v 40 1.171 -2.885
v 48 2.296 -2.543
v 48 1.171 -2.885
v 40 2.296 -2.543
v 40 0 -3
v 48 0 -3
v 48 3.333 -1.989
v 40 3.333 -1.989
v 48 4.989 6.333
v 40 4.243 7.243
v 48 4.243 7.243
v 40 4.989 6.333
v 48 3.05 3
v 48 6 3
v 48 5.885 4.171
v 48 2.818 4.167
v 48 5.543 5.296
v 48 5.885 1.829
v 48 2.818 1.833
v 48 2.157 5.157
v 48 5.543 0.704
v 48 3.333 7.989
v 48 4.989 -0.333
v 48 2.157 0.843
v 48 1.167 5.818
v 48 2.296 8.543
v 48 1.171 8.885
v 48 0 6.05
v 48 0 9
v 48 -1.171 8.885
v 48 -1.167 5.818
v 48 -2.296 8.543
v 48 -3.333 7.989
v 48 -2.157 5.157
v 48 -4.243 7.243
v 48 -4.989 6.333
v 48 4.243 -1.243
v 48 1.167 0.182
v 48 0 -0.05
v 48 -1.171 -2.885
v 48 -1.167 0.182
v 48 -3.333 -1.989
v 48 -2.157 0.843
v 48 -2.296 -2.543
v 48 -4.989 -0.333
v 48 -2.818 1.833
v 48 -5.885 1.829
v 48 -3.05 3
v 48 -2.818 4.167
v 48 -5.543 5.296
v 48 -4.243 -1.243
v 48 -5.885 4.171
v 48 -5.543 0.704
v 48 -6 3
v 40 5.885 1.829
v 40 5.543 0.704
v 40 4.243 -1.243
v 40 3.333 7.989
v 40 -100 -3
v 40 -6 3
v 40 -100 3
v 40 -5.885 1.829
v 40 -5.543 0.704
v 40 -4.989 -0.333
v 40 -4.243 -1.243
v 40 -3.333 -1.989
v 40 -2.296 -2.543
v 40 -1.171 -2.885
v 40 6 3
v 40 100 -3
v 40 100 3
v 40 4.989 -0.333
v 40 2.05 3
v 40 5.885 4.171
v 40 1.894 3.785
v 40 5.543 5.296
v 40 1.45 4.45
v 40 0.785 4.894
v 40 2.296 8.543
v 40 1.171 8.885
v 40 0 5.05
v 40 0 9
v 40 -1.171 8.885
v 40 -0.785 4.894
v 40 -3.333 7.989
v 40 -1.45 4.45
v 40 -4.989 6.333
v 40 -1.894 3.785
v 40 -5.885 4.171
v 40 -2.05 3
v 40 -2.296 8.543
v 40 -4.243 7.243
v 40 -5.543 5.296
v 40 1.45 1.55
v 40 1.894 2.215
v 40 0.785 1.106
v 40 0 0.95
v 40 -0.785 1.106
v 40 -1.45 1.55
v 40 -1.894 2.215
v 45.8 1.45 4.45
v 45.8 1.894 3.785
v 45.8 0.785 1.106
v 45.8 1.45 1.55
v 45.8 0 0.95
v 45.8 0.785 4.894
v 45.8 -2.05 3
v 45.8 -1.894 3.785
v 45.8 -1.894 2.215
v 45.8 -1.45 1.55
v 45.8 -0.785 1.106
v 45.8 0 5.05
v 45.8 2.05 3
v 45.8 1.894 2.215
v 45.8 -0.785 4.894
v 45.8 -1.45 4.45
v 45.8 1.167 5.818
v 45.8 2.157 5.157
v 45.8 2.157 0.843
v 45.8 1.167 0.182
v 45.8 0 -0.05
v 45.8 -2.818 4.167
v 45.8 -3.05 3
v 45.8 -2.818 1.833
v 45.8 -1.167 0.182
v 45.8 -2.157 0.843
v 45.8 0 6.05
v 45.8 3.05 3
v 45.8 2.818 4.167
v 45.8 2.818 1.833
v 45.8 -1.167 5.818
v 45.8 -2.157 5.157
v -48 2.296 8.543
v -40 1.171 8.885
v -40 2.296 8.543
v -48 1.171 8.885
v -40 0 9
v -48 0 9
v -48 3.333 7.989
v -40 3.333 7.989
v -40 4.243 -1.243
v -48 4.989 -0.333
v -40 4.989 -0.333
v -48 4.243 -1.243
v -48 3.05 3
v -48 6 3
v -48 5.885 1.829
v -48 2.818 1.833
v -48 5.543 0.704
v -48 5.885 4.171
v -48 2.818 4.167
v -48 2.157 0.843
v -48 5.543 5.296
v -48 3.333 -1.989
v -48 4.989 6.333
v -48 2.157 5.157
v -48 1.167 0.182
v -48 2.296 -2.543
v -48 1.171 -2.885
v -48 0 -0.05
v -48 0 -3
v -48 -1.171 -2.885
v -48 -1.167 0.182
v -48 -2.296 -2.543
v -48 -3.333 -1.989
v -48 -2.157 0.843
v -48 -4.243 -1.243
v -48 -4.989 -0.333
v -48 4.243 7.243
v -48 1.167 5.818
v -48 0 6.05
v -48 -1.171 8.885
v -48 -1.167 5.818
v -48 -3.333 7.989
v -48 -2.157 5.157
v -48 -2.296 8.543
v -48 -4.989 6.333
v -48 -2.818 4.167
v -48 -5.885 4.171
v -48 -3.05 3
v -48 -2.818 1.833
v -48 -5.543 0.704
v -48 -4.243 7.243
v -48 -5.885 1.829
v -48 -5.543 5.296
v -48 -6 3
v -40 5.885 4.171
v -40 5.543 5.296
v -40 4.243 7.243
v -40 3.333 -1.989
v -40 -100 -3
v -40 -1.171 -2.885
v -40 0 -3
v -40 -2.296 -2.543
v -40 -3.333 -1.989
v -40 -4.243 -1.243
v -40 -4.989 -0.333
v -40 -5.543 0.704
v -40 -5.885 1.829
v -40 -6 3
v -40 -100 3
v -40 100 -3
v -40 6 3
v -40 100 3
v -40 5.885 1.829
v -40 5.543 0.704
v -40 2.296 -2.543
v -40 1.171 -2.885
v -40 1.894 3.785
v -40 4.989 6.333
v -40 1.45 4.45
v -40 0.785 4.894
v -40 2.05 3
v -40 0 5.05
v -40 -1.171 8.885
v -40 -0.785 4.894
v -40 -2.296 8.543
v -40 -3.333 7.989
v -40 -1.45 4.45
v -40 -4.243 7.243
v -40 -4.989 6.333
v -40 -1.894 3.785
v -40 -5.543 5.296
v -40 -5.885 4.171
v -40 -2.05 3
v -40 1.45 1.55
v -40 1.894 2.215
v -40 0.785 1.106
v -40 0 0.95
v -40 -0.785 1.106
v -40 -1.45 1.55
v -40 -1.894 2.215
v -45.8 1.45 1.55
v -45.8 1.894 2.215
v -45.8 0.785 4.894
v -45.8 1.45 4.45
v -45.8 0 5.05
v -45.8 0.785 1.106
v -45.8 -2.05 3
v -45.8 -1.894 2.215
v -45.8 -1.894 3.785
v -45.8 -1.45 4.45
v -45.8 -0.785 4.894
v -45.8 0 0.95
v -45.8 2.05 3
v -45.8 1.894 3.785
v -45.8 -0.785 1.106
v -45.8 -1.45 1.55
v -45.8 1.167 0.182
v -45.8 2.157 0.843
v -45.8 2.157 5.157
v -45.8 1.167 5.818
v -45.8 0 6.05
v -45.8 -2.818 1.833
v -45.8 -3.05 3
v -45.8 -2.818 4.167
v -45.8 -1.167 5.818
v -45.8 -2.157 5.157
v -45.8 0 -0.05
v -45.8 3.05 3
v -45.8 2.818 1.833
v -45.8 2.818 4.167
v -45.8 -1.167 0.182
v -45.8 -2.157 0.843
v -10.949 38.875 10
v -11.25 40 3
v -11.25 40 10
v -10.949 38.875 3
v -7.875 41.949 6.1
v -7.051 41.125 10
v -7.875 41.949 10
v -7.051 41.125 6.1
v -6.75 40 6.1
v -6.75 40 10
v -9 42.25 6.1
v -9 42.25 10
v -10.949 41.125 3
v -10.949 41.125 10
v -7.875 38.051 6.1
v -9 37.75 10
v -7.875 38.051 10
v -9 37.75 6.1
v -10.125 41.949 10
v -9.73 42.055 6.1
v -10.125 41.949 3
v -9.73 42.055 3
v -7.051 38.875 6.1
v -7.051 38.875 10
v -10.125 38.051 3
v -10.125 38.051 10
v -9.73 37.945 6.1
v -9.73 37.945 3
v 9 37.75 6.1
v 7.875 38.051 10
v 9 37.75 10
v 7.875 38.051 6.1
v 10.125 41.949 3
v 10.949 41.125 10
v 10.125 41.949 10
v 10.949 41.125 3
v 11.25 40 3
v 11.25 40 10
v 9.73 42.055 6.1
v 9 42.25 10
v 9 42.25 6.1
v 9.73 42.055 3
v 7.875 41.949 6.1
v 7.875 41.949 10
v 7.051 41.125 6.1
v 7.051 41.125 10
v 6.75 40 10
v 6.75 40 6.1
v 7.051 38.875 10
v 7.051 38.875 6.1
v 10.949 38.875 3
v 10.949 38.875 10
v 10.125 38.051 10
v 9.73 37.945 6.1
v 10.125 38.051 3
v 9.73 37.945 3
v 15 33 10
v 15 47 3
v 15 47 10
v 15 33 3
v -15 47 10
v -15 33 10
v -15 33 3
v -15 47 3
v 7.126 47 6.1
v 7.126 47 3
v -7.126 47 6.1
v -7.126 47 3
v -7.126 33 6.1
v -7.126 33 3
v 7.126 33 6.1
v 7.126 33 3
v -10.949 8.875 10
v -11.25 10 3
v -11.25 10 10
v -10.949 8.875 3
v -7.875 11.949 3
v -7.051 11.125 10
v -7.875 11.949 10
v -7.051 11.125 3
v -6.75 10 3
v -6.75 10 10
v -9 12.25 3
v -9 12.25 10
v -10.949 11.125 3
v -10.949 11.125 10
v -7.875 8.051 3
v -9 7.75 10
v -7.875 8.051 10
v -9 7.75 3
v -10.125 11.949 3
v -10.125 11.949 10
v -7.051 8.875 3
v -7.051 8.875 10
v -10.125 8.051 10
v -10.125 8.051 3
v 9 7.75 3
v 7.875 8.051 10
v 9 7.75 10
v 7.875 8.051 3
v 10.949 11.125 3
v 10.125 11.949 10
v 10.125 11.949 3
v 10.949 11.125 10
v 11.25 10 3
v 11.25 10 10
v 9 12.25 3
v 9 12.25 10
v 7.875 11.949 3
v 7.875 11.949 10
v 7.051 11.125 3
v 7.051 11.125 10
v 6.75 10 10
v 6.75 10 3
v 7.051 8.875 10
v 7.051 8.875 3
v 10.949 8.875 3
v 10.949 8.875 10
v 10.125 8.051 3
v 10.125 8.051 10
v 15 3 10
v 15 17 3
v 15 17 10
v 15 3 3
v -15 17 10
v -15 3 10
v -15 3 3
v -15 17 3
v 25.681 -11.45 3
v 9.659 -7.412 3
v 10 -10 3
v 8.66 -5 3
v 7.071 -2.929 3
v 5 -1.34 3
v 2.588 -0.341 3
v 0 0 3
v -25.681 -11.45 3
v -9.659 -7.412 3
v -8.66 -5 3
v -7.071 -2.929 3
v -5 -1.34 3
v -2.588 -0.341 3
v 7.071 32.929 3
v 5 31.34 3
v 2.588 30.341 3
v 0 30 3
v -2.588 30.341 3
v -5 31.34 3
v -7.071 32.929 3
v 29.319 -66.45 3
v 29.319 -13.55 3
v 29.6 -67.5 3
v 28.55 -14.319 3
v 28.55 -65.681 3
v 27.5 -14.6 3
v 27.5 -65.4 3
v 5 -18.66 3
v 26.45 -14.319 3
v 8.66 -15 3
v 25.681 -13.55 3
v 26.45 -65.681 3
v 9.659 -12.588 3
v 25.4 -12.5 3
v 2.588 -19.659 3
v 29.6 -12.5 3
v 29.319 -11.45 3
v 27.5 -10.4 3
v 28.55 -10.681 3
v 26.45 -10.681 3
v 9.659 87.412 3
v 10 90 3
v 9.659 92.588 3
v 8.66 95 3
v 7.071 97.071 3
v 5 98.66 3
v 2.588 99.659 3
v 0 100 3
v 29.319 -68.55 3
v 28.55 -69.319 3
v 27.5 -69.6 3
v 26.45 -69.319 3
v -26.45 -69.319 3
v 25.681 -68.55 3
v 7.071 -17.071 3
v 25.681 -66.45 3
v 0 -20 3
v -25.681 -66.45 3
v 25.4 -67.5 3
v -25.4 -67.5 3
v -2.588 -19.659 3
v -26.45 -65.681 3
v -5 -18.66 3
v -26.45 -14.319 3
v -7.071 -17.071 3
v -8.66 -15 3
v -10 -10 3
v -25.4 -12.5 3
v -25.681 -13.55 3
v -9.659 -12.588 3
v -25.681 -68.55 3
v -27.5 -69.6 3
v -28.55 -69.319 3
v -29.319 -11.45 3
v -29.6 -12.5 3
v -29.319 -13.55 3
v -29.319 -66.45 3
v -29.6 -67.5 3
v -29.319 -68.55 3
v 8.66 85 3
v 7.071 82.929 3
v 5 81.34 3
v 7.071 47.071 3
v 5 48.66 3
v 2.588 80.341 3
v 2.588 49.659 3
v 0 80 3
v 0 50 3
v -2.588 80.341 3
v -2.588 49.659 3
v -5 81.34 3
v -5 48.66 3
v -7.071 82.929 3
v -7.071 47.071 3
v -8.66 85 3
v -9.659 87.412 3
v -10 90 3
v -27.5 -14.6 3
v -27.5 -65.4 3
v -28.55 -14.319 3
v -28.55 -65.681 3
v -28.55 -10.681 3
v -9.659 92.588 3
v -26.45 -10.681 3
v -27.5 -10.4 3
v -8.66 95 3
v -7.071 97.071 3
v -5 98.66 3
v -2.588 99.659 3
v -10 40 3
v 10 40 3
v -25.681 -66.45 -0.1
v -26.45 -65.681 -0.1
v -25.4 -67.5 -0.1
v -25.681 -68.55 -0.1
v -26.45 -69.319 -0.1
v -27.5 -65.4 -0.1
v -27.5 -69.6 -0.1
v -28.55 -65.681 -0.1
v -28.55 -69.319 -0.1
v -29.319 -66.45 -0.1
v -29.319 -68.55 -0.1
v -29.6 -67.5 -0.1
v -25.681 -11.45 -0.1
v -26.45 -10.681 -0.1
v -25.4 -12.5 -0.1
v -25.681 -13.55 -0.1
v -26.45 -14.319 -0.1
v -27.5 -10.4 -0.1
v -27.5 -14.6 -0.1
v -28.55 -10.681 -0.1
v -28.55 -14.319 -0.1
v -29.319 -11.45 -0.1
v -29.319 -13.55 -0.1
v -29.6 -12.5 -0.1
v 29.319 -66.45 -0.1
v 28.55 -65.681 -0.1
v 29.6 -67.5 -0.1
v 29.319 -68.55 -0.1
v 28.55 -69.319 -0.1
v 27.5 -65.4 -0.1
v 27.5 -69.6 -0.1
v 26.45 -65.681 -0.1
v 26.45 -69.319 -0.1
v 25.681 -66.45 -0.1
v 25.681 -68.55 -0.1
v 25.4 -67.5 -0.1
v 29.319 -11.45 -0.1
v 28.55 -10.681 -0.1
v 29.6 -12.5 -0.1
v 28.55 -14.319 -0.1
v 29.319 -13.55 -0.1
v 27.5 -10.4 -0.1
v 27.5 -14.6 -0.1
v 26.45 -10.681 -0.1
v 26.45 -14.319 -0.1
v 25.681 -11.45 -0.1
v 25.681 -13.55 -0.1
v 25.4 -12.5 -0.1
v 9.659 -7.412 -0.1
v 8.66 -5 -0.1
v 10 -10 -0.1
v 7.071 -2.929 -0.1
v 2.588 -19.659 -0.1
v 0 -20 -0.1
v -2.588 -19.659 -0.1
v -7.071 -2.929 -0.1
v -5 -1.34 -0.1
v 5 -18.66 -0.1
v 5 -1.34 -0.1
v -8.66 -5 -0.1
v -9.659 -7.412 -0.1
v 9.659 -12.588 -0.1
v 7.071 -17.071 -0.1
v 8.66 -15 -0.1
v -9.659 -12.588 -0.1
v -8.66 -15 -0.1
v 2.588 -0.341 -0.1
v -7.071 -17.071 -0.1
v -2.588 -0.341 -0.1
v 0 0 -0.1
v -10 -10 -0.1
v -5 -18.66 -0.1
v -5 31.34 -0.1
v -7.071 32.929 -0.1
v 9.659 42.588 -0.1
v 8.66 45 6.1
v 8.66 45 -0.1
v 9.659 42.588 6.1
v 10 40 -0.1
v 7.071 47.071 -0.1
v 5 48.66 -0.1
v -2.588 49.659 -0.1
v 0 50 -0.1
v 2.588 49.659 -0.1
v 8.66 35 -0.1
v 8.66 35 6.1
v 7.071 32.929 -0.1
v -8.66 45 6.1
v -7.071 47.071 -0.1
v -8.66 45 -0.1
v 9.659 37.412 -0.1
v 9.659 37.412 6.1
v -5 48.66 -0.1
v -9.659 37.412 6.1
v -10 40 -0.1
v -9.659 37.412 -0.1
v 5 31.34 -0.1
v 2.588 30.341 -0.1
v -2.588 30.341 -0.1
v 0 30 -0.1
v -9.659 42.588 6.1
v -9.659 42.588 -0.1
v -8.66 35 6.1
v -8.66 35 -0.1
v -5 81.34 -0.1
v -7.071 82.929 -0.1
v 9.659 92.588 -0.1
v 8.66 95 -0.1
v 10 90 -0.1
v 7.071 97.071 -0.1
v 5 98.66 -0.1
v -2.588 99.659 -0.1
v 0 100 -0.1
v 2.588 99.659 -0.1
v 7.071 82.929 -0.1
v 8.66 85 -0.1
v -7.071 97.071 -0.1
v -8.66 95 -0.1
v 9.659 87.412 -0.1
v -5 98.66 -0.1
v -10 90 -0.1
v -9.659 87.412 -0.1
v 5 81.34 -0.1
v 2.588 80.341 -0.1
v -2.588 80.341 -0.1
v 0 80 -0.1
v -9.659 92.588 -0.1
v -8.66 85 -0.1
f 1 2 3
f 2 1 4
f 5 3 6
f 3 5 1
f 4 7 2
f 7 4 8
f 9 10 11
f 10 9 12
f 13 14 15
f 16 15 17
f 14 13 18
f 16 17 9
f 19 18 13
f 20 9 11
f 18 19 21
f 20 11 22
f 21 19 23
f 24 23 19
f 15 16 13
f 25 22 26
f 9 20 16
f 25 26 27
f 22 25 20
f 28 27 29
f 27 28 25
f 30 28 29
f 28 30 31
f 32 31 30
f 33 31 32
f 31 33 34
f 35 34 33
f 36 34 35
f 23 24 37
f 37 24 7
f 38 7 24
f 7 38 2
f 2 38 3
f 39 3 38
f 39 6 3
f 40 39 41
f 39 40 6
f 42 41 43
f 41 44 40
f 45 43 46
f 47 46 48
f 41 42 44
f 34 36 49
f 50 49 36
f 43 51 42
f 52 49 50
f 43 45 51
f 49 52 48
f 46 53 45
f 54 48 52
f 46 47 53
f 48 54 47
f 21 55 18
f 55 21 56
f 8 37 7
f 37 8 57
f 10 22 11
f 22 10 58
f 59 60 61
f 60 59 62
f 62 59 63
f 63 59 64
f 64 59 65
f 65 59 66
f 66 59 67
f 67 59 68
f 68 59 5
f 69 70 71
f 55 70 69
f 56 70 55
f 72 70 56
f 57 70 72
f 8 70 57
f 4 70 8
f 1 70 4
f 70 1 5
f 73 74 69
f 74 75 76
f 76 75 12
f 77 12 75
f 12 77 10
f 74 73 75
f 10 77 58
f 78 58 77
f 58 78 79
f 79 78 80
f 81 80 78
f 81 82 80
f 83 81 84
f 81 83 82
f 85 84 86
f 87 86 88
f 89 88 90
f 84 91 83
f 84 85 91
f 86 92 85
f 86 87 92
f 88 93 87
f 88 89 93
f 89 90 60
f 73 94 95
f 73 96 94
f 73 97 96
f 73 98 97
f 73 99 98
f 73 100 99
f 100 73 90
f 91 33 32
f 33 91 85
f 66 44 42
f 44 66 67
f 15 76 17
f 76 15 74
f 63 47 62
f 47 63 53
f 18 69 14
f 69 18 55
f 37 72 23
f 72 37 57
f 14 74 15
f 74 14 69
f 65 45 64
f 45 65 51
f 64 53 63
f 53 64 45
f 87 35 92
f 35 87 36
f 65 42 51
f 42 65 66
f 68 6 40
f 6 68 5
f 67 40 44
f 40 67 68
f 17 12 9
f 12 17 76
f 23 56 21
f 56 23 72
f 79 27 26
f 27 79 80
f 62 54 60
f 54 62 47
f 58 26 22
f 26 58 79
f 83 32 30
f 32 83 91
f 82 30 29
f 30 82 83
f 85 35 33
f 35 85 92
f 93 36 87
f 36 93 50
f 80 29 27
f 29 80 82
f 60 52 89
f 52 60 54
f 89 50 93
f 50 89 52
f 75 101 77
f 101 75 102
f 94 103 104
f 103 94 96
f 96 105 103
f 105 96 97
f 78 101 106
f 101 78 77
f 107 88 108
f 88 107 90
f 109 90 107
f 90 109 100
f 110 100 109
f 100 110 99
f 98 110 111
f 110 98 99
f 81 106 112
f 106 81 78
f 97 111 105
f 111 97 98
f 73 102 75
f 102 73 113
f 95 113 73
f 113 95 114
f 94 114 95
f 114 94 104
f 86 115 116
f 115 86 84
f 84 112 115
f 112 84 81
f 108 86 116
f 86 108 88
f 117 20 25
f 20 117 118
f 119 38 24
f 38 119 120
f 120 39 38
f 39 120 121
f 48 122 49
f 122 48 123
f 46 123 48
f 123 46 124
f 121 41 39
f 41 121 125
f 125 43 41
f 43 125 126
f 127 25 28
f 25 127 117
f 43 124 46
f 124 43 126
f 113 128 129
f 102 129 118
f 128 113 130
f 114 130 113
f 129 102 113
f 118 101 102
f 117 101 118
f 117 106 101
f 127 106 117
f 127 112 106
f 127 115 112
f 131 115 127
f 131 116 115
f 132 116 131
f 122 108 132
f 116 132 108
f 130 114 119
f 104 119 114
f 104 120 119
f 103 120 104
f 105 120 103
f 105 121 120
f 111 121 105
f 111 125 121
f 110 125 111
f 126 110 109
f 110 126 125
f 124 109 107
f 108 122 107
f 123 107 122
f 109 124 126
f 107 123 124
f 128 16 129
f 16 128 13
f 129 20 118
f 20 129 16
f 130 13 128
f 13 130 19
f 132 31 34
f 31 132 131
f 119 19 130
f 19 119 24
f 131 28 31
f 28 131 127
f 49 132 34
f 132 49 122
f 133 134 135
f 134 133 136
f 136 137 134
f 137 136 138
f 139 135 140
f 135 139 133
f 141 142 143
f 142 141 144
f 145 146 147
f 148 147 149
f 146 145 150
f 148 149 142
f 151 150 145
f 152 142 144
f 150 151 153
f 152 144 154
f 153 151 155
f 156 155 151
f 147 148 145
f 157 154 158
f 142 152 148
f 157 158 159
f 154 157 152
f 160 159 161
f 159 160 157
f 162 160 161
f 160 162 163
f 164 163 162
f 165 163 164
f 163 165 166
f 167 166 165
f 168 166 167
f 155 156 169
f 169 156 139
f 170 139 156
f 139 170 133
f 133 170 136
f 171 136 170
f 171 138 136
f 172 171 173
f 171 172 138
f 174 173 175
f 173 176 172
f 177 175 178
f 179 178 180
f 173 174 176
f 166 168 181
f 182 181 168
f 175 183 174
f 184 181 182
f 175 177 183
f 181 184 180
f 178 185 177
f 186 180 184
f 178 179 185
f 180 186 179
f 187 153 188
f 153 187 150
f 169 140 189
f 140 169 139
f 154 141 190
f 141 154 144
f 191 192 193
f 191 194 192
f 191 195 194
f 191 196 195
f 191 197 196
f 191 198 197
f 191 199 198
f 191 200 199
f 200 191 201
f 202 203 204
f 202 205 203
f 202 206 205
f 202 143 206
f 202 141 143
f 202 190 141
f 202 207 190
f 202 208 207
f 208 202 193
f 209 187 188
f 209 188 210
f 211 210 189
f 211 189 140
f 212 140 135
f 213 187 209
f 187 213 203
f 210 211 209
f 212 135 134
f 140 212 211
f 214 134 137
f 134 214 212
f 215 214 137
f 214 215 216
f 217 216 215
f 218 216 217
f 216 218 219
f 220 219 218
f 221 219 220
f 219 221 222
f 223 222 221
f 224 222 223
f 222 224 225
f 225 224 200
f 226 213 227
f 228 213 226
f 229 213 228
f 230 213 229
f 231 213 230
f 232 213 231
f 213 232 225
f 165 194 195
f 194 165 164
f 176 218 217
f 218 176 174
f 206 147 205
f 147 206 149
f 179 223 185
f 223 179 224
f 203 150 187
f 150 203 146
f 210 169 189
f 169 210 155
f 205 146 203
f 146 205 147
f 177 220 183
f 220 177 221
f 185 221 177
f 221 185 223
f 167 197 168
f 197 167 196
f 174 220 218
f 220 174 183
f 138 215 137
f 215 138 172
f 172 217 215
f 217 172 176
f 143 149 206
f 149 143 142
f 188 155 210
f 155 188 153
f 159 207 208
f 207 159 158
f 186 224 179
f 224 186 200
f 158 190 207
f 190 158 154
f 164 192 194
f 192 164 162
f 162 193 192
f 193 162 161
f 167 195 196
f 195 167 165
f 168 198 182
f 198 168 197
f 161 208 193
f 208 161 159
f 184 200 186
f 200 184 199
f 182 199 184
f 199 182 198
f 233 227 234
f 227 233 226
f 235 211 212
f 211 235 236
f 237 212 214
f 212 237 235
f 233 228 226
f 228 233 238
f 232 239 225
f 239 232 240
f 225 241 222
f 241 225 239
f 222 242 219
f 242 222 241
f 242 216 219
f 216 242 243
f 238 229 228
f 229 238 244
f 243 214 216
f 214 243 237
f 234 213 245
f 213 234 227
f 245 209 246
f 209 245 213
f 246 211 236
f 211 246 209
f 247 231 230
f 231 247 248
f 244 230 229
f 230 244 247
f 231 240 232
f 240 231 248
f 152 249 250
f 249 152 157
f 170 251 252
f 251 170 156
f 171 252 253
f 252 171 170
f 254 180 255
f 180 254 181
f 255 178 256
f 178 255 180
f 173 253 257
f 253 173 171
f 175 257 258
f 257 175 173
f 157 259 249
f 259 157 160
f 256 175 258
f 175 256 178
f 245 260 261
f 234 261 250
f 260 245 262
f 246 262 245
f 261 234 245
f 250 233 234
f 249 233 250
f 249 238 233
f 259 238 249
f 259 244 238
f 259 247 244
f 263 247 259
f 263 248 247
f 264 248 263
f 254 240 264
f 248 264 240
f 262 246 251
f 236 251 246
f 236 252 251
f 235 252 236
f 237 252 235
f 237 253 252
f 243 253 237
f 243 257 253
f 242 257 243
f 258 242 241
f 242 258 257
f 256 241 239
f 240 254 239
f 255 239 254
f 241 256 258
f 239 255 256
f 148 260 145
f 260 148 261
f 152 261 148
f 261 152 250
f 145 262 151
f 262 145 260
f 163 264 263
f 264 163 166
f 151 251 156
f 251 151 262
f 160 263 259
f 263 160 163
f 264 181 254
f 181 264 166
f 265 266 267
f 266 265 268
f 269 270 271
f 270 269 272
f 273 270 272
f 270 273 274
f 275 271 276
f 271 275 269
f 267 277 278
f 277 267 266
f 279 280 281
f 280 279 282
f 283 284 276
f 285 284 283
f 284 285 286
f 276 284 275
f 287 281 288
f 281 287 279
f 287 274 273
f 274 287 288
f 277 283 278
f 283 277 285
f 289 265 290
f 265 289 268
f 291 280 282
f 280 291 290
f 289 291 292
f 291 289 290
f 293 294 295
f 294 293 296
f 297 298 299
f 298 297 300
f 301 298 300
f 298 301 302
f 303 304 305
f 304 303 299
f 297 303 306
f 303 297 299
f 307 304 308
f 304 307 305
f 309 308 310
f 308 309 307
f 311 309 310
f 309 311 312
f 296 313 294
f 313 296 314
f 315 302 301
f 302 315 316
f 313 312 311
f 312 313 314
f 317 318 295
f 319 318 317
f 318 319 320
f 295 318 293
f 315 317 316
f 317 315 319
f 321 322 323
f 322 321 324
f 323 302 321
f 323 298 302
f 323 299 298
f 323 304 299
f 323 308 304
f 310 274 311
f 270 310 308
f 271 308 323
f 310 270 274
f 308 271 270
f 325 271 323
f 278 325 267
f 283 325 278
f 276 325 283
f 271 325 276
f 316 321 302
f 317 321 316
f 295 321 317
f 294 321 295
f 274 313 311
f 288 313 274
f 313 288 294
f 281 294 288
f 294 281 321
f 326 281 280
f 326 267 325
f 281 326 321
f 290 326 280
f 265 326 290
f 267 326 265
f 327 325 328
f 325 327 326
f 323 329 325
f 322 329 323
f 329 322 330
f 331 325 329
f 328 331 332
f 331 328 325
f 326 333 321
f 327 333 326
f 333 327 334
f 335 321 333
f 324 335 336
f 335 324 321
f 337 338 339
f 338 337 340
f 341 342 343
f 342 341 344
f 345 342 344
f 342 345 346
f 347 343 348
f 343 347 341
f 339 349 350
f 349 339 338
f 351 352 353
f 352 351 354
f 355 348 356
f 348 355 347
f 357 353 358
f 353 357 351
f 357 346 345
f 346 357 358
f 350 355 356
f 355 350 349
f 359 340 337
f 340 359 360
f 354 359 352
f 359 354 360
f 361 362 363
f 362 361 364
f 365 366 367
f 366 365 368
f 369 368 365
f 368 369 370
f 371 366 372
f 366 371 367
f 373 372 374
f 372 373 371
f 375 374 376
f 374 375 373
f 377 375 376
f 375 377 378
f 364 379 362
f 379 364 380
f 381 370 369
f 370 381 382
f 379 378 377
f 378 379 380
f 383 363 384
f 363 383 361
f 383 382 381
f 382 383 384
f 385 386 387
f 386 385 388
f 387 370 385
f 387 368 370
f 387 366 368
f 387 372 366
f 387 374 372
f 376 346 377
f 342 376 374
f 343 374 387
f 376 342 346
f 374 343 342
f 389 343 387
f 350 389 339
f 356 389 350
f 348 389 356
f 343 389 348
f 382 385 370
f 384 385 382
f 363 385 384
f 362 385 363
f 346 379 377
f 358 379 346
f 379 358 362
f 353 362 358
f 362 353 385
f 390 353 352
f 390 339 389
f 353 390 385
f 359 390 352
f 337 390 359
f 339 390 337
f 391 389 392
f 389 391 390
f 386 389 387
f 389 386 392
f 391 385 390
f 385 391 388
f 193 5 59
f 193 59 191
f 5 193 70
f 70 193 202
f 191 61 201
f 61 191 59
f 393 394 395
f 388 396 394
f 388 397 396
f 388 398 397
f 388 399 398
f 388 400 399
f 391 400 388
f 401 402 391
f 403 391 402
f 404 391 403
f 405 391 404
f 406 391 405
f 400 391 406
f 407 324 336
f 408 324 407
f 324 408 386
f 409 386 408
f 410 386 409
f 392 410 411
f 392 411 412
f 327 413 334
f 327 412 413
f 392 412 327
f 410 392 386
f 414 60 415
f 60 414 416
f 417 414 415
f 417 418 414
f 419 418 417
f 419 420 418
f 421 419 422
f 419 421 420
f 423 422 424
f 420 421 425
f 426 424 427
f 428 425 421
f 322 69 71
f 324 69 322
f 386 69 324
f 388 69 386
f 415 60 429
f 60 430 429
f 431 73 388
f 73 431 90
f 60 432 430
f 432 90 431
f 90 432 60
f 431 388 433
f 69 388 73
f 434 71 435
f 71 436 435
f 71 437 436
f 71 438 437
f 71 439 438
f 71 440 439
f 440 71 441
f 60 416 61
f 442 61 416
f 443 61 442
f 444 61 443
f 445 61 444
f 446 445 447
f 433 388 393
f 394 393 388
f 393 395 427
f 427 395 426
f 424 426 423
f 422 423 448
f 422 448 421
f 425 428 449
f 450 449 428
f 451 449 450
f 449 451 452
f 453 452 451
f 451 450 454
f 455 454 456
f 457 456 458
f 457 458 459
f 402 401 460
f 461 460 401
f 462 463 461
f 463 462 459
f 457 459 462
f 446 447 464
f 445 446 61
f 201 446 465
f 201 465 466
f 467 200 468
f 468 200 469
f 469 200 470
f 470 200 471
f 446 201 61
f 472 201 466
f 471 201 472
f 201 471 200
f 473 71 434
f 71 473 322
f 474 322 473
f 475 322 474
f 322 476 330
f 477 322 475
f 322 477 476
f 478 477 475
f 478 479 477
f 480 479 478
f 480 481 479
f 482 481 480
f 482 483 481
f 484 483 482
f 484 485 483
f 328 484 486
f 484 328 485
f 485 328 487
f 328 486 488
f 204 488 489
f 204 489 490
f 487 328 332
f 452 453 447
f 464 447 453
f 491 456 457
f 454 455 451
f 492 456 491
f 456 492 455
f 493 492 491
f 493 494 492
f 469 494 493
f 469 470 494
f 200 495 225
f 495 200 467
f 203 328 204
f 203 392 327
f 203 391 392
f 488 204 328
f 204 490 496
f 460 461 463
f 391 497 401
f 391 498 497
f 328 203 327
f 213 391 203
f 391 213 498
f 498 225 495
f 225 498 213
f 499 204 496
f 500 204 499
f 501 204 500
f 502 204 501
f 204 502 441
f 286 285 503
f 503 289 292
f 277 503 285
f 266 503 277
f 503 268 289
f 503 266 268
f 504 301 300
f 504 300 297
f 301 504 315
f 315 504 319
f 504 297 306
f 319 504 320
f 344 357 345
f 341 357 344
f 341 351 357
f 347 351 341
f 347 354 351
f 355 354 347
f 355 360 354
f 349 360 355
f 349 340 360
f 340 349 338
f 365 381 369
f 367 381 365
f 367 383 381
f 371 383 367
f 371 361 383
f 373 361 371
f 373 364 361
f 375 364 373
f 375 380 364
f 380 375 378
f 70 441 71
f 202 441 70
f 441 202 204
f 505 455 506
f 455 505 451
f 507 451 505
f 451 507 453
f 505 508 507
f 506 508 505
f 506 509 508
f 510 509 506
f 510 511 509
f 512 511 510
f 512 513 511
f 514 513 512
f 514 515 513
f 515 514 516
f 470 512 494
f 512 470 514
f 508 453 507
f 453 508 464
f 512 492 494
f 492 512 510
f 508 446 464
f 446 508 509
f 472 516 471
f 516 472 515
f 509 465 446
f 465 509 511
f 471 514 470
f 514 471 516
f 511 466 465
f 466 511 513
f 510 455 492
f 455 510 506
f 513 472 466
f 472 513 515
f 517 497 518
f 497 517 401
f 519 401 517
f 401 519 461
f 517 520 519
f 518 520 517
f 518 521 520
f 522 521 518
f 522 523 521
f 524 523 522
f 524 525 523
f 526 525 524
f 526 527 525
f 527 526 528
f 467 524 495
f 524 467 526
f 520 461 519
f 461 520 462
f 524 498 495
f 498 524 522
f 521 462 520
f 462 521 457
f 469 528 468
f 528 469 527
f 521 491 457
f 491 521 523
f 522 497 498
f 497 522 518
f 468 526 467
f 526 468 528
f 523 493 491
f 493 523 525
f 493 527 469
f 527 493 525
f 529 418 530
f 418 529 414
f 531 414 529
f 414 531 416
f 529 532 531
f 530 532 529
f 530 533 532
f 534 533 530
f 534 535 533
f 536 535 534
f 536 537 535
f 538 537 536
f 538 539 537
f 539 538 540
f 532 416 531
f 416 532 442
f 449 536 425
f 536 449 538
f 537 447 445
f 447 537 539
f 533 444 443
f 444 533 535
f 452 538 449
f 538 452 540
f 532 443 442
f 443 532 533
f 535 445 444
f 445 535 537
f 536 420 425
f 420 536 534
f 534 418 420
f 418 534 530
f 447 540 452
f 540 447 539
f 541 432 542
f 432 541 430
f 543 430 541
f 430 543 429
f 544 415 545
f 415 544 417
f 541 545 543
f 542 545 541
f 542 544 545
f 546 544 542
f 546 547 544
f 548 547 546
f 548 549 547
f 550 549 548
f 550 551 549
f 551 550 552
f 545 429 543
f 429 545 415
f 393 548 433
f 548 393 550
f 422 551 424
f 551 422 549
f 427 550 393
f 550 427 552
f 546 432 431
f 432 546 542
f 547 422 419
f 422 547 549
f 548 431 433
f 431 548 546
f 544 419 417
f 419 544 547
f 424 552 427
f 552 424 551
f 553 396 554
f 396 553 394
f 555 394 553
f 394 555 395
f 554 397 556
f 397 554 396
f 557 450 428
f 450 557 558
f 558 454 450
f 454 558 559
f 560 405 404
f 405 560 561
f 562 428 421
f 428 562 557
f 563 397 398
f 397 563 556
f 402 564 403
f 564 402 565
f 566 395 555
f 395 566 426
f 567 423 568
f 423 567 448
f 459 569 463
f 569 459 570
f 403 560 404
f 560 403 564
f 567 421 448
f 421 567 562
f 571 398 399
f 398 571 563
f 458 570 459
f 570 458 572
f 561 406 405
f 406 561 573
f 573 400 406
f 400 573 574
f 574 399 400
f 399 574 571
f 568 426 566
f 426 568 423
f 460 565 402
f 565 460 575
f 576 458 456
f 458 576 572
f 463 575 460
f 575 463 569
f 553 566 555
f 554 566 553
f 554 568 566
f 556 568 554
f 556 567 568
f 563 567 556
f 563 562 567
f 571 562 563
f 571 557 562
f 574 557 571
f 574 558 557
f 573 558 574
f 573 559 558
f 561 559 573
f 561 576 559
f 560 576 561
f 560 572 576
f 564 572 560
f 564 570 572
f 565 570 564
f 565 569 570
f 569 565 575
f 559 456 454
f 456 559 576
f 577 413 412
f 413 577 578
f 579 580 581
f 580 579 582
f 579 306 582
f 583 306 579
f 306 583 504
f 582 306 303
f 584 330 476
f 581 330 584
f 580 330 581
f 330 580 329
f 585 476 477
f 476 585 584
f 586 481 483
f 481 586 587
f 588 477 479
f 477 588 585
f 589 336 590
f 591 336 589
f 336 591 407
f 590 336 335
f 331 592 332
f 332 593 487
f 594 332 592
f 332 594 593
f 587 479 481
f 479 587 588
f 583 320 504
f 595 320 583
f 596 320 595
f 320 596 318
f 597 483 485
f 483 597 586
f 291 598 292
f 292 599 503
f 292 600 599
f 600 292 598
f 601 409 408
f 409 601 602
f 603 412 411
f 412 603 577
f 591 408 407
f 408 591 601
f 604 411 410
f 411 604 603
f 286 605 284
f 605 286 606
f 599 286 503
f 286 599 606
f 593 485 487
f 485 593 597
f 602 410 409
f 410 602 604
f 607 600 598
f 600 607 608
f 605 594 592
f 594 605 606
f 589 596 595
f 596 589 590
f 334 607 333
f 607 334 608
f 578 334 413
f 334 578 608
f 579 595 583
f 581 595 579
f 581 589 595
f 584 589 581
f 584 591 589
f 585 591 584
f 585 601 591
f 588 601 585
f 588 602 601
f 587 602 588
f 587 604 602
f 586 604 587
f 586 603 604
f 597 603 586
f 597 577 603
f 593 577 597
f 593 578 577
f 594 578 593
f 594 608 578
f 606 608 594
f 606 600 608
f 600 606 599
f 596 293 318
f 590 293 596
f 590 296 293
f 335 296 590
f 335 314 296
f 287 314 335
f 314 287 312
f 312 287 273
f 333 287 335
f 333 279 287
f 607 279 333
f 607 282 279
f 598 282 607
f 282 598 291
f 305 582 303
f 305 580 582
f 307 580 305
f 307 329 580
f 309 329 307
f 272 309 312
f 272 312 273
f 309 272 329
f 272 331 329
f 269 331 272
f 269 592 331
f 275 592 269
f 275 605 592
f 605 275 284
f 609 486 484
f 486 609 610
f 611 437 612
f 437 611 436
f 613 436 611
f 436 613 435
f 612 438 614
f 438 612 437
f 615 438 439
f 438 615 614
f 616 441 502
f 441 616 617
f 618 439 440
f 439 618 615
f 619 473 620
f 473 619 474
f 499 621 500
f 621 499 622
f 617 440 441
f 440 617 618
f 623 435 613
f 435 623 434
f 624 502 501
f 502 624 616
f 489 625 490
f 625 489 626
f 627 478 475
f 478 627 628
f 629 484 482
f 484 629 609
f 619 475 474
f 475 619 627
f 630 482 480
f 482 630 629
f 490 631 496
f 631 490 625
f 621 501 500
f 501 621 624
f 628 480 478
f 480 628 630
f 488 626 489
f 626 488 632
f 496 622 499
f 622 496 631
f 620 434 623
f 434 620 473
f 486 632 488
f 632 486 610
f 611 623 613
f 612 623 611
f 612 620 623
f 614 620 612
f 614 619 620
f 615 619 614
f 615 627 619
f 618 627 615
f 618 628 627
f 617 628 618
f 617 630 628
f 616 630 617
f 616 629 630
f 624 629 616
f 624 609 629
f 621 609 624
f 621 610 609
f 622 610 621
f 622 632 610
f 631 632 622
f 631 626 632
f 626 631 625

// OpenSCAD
// ===========================================================================
// HULL-FRAME COORDINATE STANDARD - Rev R1 (2026-06-11).  See CLAUDE.md.
//   Hull frame (canonical for ALL design artifacts): X = +port (left),
//   Y = +aft (back), Z = +dorsal (up); origin = SerenityAssembly.FCStd
//   world origin.  Primary-component STLs published to airframe/stls/
//   are stored directly in hull frame, baked by tools/bake_hull_frame.py
//   (marker 'SerenityUAV HULL-FRAME R1' in the binary STL header).
//   NEVER re-bake a mesh derived from an already-baked file.
//   This file:
//     Skipper ground-support equipment - part-local print frame.  The
//     aircraft hull-frame standard does not apply to GCS hardware
//     (documented exception, like the avionics KiCad files).
// ===========================================================================
/*
 * skipper_gimbal_mount.scad
 * Antenna mounting plate for Skipper GCS directional antenna gimbal
 *
 * Author:  Steve Griffing, PE(CSE), CISSP-ISSEP, CPP
 * License: CERN-OHL-W-2.0 — see LICENSES/CERN-OHL-W 2.0 (SPDX-License-Identifier: CERN-OHL-W-2.0)
 * Revision: R (2026-06-11)
 *
 * Description:
 *   CF-PETG mounting plate that carries the 9 dBi 915 MHz Yagi (for SiK+LoRa)
 *   and the 14 dBi 5 GHz WiFi flat panel antenna on the tilt stage pivot.
 *   The plate pivots on the 4 mm CF rod through the tilt yoke MF104ZZ bearings.
 *
 *   Antenna layout (looking aft along antenna bore-sight):
 *     - Yagi:  centre of plate, top half; M4 U-bolt clamps at two points
 *     - Panel: centre of plate, lower half; 4× M4 threads at panel corners
 *
 *   Pivot boss: 4 mm bore CF rod, flanged hub at each end of the plate
 *   that slides over the MF104ZZ inner races.
 *
 *   Diametrically-magnetised disc magnet (6×2 mm, N42) pressed into pivot
 *   hub end-face for AS5600 encoder reading.
 *
 * Material: CF-PETG, 0.15 mm layers, 40% infill, 4 perimeters
 *
 * Mesh verification: run after every geometry change.
 *   openscad -o skipper_gimbal_mount.stl skipper_gimbal_mount.scad
 *   python3 tools/validate_stls.py
 */

/* ---------------------------------------------------------------------------
 * Plate geometry
 * ---------------------------------------------------------------------------*/
PLATE_W     = 80.0;  /* Plate total width (pivot axis span) mm             */
PLATE_H     = 200.0; /* Plate height mm — tall enough for both antennas     */
PLATE_T     = 6.0;   /* Plate thickness mm (CF-PETG structural)             */
CORNER_R    = 4.0;   /* Corner radius mm                                    */

/* ---------------------------------------------------------------------------
 * Pivot boss (flanged hub, one each end of pivot axis)
 * ---------------------------------------------------------------------------*/
HUB_OD      = 12.0;  /* Hub outer diameter mm (press onto MF104ZZ inner race) */
HUB_ID      = 4.1;   /* CF rod slip-fit bore mm (4.0 mm rod + 0.1 clearance) */
HUB_L       = 8.0;   /* Hub axial length mm                                  */
MAGNET_D    = 6.1;   /* Encoder magnet pocket diameter mm (6 mm disc + 0.1)  */
MAGNET_H    = 2.2;   /* Encoder magnet pocket depth mm (2 mm disc + 0.2)     */

/* ---------------------------------------------------------------------------
 * Yagi antenna clamp positions (U-bolt pattern, two stations along plate)
 * Yagi boom diameter assumed 15 mm (adjust UBOLT_D if different)
 * ---------------------------------------------------------------------------*/
UBOLT_D         = 15.5; /* U-bolt inner span mm (boom OD + 0.5 clearance)   */
UBOLT_HOLE_D    = 4.5;  /* U-bolt threaded rod clearance hole mm (M4)       */
UBOLT_PITCH     = 18.0; /* U-bolt leg centre-to-centre mm (M4 U-bolt 15mm span) */
YAGI_STATION_1  = PLATE_H / 2 + 40; /* Upper clamp Y position from plate centre mm */
YAGI_STATION_2  = PLATE_H / 2 + 10; /* Lower clamp Y position from plate centre mm */

/* ---------------------------------------------------------------------------
 * WiFi panel mounting (4× M4 holes in 55×55 mm pattern — standard VESA-like)
 * ---------------------------------------------------------------------------*/
PANEL_MOUNT_PITCH = 55.0; /* Panel mounting hole pitch (square) mm         */
PANEL_HOLE_D      = 4.2;  /* M4 clearance mm                               */
PANEL_Y_OFFSET    = -40.0;/* Panel centre offset from plate centre Y mm    */

/* ===========================================================================
 * Modules
 * ===========================================================================*/

module pivot_hub(side) {
    /*
     * Flanged pivot hub at one end of the plate (side = +1 port, -1 stbd).
     * Hub extends beyond the plate face; magnet pocket in the outer face.
     */
    translate([side * PLATE_W / 2, 0, PLATE_T / 2]) {
        rotate([0, 90 * side, 0]) {
            difference() {
                cylinder(d = HUB_OD, h = HUB_L, $fn = 32);
                /* CF rod bore */
                translate([0, 0, -0.1]) {
                    cylinder(d = HUB_ID, h = HUB_L + 0.2, $fn = 16);
                }
                /* Encoder magnet pocket in outer face */
                translate([0, 0, HUB_L - MAGNET_H]) {
                    cylinder(d = MAGNET_D, h = MAGNET_H + 0.1, $fn = 16);
                }
            }
        }
    }
}

module ubolt_clamp_plate(y_pos) {
    /*
     * Reinforcing boss at each U-bolt clamp station.
     * Includes two M4 clearance holes for U-bolt legs.
     */
    translate([0, y_pos, PLATE_T]) {
        difference() {
            cube([UBOLT_PITCH + 12, 14, 8], center = true);
            for (xi = [-1, 1]) {
                translate([xi * UBOLT_PITCH / 2, 0, -4.1]) {
                    cylinder(d = UBOLT_HOLE_D, h = 9, $fn = 12);
                }
            }
        }
    }
}

module mount_plate() {
    /*
     * Complete antenna mounting plate with pivot hubs, clamp bosses, and
     * WiFi panel mounting holes.
     */
    difference() {
        union() {
            /* Main plate */
            hull() {
                for (xi = [-1, 1]) {
                    for (yi = [-1, 1]) {
                        translate([xi * (PLATE_W / 2 - CORNER_R),
                                   yi * (PLATE_H / 2 - CORNER_R), 0]) {
                            cube([CORNER_R * 2, CORNER_R * 2, PLATE_T], center = true);
                        }
                    }
                }
            }

            /* Pivot hubs at plate ends */
            pivot_hub(+1);
            pivot_hub(-1);

            /* U-bolt clamp bosses for Yagi */
            ubolt_clamp_plate(PLATE_H / 2 - (PLATE_H - YAGI_STATION_1));
            ubolt_clamp_plate(PLATE_H / 2 - (PLATE_H - YAGI_STATION_2));
        }

        /* WiFi panel M4 mounting holes — 4× at PANEL_MOUNT_PITCH square pattern */
        for (xi = [-1, 1]) {
            for (yi = [-1, 1]) {
                translate([xi * PANEL_MOUNT_PITCH / 2,
                           PANEL_Y_OFFSET + yi * PANEL_MOUNT_PITCH / 2,
                           -0.1]) {
                    cylinder(d = PANEL_HOLE_D, h = PLATE_T + 0.2, $fn = 12);
                }
            }
        }

        /* Weight-reduction lightening holes — 3× on upper half, 2× on lower */
        for (yi = [0.25, 0.5, 0.75]) {
            translate([0, PLATE_H * yi - PLATE_H / 2 + 40, -0.1]) {
                cylinder(d = 20, h = PLATE_T + 0.2, $fn = 24);
            }
        }
    }
}

mount_plate();
